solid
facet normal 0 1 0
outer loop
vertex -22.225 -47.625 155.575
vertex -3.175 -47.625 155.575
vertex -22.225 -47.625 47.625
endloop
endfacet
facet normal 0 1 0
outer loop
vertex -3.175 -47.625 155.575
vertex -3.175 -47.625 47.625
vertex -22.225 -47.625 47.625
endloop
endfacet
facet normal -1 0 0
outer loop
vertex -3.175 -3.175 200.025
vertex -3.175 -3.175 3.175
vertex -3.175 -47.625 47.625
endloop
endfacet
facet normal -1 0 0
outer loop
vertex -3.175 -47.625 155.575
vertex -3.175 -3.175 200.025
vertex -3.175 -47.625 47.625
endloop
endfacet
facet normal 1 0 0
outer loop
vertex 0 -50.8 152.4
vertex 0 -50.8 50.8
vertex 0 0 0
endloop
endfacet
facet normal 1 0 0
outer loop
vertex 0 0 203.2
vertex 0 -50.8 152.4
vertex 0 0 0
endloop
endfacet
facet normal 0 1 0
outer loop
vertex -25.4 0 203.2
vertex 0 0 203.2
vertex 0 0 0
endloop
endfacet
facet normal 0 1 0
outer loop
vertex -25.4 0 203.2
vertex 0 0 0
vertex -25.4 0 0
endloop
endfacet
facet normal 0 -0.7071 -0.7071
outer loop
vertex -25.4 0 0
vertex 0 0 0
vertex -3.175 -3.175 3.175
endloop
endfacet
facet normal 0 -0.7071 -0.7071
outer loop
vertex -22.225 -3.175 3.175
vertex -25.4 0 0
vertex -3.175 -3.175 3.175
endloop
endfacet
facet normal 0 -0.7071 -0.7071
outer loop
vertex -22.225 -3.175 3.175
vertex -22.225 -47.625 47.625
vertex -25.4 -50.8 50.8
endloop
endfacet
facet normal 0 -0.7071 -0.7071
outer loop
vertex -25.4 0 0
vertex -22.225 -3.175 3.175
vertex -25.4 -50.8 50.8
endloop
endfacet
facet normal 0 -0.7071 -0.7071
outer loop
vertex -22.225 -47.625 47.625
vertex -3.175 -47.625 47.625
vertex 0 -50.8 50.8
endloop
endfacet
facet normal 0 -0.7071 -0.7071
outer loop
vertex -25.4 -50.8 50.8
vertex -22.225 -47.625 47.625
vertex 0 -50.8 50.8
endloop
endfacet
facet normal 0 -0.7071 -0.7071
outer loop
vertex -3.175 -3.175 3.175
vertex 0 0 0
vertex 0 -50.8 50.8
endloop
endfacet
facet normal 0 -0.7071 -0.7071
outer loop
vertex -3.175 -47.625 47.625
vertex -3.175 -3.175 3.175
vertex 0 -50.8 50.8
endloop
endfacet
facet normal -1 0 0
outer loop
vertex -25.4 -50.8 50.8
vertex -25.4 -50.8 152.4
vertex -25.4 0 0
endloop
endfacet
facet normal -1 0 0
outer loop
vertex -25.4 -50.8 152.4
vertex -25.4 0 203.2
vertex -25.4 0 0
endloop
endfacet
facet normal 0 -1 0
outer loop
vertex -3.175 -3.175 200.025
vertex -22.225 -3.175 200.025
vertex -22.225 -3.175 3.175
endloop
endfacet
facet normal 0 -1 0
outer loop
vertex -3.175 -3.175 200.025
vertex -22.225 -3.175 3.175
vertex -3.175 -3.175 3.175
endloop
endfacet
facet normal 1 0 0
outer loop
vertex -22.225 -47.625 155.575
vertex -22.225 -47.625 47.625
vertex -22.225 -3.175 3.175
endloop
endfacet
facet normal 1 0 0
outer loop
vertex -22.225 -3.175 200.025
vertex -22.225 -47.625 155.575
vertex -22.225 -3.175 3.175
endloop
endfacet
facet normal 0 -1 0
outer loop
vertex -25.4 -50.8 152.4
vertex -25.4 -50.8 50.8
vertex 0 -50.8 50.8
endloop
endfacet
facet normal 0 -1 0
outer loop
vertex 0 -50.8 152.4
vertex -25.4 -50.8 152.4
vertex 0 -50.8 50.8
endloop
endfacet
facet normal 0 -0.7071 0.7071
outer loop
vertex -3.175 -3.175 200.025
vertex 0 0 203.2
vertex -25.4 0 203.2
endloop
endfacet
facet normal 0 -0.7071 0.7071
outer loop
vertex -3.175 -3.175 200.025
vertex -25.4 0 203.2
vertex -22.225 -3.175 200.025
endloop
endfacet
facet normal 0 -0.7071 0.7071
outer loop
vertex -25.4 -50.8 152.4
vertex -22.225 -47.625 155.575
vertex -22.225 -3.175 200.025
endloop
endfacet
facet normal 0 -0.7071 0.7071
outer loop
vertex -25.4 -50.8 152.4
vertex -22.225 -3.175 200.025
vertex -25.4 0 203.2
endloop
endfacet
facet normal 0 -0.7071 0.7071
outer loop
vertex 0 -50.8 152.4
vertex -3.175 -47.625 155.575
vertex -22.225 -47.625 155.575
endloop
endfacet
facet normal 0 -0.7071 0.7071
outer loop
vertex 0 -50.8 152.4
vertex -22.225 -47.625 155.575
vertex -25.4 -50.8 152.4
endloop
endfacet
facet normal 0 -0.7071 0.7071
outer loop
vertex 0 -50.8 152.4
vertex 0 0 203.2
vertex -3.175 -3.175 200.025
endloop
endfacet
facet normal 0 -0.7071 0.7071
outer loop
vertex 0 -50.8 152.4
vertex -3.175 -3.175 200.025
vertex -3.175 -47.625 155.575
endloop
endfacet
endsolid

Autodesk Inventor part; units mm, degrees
ref_plane "YZ Plane" through (0, 0, 0) normal (1, 0, 0) x (0, 1, 0)
ref_plane "XZ Plane" through (0, 0, 0) normal (0, 1, 0) x (-1, 0, 0)
ref_plane "XY Plane" through (0, 0, 0) normal (0, 0, 1) x (1, 0, 0)
sketch "Sketch1" plane through (0, 0, 0) normal (0, 0, 1) x (1, 0, 0)
  line L0 (0, 0) -> (-25.4, 0)
  line L1 (-25.4, 0) -> (-25.4, -50.8)
  line L2 (-25.4, -50.8) -> (0, -50.8)
  line L3 (0, -50.8) -> (0, 0)
  line L4 (-22.225, -3.175) -> (-3.175, -3.175)
  line L5 (-3.175, -3.175) -> (-3.175, -47.625)
  line L6 (-3.175, -47.625) -> (-22.225, -47.625)
  line L7 (-22.225, -47.625) -> (-22.225, -3.175)
  dimension "d0" = 25.4
  dimension "d1" = 50.8
  dimension "d2" = 3.175
extrude "Extrusion1" add sketch "Sketch1" along normal blind 203.2
sketch "Sketch2" plane through (0, -50.8, 0) normal (1, 0, 0) x (0, 0, -1)
  line L0 (-203.2, 50.8) -> (-152.4, 0)
  line L1 (0, 0) -> (-203.2, 0) projected
  line L2 (-203.2, 0) -> (-152.4, 0)
  line L3 (-203.2, 0) -> (-203.2, 50.8)
  line L4 (0, 50.8) -> (0, 0)
  line L5 (0, 50.8) -> (0, 0) projected
  line L6 (0, 0) -> (-50.8, 0)
  line L7 (0, 50.8) -> (-50.8, 0)
  dimension "d5" = 45
  dimension "d6" = 45
  dimension "d7" = 90
  dimension "d8" = 71.8421
  dimension "d9" = 50.8
  dimension "d10" = 50.8
  dimension "d11" = 45
  dimension "d12" = 45
  dimension "d13" = 71.8421
extrude "Extrusion2" cut sketch "Sketch2" against normal blind 203.2
properties part number "Arm Angle brace"
